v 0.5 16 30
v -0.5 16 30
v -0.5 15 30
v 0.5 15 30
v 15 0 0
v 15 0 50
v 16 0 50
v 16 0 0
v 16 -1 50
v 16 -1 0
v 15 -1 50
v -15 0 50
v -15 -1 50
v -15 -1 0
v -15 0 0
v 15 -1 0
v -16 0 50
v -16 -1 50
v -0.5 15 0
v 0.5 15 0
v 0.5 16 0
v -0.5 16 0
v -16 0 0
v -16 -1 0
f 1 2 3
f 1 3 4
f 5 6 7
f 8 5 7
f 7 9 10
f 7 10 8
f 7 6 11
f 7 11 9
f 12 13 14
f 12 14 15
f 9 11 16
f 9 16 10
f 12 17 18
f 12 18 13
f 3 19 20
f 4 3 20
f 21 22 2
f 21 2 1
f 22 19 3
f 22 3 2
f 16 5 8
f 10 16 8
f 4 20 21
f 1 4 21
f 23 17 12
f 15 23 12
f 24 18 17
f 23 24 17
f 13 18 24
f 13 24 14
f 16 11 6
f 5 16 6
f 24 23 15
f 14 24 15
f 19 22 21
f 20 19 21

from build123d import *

# Parameters (mm, degrees)
F0_W     = 1
F0_H     = 1
F1_DEPTH = 50
F2_DEPTH = 30


with BuildPart() as f1:
    # F0 (on Top) → F1 (new body)
    with BuildSketch(Plane.XY):
        with Locations((15.5, -0.5)):
            Rectangle(F0_W, F0_H)
        with Locations((-15.5, -0.5)):
            Rectangle(F0_W, F0_H)
    extrude(amount=F1_DEPTH)


with BuildPart() as f2:
    # F0 (on Top) → F2 (new body)
    with BuildSketch(Plane.XY):
        with Locations((0, 15.5)):
            Rectangle(F0_W, F0_H)
    extrude(amount=F2_DEPTH)


solid = Compound([f1.part, f2.part])
